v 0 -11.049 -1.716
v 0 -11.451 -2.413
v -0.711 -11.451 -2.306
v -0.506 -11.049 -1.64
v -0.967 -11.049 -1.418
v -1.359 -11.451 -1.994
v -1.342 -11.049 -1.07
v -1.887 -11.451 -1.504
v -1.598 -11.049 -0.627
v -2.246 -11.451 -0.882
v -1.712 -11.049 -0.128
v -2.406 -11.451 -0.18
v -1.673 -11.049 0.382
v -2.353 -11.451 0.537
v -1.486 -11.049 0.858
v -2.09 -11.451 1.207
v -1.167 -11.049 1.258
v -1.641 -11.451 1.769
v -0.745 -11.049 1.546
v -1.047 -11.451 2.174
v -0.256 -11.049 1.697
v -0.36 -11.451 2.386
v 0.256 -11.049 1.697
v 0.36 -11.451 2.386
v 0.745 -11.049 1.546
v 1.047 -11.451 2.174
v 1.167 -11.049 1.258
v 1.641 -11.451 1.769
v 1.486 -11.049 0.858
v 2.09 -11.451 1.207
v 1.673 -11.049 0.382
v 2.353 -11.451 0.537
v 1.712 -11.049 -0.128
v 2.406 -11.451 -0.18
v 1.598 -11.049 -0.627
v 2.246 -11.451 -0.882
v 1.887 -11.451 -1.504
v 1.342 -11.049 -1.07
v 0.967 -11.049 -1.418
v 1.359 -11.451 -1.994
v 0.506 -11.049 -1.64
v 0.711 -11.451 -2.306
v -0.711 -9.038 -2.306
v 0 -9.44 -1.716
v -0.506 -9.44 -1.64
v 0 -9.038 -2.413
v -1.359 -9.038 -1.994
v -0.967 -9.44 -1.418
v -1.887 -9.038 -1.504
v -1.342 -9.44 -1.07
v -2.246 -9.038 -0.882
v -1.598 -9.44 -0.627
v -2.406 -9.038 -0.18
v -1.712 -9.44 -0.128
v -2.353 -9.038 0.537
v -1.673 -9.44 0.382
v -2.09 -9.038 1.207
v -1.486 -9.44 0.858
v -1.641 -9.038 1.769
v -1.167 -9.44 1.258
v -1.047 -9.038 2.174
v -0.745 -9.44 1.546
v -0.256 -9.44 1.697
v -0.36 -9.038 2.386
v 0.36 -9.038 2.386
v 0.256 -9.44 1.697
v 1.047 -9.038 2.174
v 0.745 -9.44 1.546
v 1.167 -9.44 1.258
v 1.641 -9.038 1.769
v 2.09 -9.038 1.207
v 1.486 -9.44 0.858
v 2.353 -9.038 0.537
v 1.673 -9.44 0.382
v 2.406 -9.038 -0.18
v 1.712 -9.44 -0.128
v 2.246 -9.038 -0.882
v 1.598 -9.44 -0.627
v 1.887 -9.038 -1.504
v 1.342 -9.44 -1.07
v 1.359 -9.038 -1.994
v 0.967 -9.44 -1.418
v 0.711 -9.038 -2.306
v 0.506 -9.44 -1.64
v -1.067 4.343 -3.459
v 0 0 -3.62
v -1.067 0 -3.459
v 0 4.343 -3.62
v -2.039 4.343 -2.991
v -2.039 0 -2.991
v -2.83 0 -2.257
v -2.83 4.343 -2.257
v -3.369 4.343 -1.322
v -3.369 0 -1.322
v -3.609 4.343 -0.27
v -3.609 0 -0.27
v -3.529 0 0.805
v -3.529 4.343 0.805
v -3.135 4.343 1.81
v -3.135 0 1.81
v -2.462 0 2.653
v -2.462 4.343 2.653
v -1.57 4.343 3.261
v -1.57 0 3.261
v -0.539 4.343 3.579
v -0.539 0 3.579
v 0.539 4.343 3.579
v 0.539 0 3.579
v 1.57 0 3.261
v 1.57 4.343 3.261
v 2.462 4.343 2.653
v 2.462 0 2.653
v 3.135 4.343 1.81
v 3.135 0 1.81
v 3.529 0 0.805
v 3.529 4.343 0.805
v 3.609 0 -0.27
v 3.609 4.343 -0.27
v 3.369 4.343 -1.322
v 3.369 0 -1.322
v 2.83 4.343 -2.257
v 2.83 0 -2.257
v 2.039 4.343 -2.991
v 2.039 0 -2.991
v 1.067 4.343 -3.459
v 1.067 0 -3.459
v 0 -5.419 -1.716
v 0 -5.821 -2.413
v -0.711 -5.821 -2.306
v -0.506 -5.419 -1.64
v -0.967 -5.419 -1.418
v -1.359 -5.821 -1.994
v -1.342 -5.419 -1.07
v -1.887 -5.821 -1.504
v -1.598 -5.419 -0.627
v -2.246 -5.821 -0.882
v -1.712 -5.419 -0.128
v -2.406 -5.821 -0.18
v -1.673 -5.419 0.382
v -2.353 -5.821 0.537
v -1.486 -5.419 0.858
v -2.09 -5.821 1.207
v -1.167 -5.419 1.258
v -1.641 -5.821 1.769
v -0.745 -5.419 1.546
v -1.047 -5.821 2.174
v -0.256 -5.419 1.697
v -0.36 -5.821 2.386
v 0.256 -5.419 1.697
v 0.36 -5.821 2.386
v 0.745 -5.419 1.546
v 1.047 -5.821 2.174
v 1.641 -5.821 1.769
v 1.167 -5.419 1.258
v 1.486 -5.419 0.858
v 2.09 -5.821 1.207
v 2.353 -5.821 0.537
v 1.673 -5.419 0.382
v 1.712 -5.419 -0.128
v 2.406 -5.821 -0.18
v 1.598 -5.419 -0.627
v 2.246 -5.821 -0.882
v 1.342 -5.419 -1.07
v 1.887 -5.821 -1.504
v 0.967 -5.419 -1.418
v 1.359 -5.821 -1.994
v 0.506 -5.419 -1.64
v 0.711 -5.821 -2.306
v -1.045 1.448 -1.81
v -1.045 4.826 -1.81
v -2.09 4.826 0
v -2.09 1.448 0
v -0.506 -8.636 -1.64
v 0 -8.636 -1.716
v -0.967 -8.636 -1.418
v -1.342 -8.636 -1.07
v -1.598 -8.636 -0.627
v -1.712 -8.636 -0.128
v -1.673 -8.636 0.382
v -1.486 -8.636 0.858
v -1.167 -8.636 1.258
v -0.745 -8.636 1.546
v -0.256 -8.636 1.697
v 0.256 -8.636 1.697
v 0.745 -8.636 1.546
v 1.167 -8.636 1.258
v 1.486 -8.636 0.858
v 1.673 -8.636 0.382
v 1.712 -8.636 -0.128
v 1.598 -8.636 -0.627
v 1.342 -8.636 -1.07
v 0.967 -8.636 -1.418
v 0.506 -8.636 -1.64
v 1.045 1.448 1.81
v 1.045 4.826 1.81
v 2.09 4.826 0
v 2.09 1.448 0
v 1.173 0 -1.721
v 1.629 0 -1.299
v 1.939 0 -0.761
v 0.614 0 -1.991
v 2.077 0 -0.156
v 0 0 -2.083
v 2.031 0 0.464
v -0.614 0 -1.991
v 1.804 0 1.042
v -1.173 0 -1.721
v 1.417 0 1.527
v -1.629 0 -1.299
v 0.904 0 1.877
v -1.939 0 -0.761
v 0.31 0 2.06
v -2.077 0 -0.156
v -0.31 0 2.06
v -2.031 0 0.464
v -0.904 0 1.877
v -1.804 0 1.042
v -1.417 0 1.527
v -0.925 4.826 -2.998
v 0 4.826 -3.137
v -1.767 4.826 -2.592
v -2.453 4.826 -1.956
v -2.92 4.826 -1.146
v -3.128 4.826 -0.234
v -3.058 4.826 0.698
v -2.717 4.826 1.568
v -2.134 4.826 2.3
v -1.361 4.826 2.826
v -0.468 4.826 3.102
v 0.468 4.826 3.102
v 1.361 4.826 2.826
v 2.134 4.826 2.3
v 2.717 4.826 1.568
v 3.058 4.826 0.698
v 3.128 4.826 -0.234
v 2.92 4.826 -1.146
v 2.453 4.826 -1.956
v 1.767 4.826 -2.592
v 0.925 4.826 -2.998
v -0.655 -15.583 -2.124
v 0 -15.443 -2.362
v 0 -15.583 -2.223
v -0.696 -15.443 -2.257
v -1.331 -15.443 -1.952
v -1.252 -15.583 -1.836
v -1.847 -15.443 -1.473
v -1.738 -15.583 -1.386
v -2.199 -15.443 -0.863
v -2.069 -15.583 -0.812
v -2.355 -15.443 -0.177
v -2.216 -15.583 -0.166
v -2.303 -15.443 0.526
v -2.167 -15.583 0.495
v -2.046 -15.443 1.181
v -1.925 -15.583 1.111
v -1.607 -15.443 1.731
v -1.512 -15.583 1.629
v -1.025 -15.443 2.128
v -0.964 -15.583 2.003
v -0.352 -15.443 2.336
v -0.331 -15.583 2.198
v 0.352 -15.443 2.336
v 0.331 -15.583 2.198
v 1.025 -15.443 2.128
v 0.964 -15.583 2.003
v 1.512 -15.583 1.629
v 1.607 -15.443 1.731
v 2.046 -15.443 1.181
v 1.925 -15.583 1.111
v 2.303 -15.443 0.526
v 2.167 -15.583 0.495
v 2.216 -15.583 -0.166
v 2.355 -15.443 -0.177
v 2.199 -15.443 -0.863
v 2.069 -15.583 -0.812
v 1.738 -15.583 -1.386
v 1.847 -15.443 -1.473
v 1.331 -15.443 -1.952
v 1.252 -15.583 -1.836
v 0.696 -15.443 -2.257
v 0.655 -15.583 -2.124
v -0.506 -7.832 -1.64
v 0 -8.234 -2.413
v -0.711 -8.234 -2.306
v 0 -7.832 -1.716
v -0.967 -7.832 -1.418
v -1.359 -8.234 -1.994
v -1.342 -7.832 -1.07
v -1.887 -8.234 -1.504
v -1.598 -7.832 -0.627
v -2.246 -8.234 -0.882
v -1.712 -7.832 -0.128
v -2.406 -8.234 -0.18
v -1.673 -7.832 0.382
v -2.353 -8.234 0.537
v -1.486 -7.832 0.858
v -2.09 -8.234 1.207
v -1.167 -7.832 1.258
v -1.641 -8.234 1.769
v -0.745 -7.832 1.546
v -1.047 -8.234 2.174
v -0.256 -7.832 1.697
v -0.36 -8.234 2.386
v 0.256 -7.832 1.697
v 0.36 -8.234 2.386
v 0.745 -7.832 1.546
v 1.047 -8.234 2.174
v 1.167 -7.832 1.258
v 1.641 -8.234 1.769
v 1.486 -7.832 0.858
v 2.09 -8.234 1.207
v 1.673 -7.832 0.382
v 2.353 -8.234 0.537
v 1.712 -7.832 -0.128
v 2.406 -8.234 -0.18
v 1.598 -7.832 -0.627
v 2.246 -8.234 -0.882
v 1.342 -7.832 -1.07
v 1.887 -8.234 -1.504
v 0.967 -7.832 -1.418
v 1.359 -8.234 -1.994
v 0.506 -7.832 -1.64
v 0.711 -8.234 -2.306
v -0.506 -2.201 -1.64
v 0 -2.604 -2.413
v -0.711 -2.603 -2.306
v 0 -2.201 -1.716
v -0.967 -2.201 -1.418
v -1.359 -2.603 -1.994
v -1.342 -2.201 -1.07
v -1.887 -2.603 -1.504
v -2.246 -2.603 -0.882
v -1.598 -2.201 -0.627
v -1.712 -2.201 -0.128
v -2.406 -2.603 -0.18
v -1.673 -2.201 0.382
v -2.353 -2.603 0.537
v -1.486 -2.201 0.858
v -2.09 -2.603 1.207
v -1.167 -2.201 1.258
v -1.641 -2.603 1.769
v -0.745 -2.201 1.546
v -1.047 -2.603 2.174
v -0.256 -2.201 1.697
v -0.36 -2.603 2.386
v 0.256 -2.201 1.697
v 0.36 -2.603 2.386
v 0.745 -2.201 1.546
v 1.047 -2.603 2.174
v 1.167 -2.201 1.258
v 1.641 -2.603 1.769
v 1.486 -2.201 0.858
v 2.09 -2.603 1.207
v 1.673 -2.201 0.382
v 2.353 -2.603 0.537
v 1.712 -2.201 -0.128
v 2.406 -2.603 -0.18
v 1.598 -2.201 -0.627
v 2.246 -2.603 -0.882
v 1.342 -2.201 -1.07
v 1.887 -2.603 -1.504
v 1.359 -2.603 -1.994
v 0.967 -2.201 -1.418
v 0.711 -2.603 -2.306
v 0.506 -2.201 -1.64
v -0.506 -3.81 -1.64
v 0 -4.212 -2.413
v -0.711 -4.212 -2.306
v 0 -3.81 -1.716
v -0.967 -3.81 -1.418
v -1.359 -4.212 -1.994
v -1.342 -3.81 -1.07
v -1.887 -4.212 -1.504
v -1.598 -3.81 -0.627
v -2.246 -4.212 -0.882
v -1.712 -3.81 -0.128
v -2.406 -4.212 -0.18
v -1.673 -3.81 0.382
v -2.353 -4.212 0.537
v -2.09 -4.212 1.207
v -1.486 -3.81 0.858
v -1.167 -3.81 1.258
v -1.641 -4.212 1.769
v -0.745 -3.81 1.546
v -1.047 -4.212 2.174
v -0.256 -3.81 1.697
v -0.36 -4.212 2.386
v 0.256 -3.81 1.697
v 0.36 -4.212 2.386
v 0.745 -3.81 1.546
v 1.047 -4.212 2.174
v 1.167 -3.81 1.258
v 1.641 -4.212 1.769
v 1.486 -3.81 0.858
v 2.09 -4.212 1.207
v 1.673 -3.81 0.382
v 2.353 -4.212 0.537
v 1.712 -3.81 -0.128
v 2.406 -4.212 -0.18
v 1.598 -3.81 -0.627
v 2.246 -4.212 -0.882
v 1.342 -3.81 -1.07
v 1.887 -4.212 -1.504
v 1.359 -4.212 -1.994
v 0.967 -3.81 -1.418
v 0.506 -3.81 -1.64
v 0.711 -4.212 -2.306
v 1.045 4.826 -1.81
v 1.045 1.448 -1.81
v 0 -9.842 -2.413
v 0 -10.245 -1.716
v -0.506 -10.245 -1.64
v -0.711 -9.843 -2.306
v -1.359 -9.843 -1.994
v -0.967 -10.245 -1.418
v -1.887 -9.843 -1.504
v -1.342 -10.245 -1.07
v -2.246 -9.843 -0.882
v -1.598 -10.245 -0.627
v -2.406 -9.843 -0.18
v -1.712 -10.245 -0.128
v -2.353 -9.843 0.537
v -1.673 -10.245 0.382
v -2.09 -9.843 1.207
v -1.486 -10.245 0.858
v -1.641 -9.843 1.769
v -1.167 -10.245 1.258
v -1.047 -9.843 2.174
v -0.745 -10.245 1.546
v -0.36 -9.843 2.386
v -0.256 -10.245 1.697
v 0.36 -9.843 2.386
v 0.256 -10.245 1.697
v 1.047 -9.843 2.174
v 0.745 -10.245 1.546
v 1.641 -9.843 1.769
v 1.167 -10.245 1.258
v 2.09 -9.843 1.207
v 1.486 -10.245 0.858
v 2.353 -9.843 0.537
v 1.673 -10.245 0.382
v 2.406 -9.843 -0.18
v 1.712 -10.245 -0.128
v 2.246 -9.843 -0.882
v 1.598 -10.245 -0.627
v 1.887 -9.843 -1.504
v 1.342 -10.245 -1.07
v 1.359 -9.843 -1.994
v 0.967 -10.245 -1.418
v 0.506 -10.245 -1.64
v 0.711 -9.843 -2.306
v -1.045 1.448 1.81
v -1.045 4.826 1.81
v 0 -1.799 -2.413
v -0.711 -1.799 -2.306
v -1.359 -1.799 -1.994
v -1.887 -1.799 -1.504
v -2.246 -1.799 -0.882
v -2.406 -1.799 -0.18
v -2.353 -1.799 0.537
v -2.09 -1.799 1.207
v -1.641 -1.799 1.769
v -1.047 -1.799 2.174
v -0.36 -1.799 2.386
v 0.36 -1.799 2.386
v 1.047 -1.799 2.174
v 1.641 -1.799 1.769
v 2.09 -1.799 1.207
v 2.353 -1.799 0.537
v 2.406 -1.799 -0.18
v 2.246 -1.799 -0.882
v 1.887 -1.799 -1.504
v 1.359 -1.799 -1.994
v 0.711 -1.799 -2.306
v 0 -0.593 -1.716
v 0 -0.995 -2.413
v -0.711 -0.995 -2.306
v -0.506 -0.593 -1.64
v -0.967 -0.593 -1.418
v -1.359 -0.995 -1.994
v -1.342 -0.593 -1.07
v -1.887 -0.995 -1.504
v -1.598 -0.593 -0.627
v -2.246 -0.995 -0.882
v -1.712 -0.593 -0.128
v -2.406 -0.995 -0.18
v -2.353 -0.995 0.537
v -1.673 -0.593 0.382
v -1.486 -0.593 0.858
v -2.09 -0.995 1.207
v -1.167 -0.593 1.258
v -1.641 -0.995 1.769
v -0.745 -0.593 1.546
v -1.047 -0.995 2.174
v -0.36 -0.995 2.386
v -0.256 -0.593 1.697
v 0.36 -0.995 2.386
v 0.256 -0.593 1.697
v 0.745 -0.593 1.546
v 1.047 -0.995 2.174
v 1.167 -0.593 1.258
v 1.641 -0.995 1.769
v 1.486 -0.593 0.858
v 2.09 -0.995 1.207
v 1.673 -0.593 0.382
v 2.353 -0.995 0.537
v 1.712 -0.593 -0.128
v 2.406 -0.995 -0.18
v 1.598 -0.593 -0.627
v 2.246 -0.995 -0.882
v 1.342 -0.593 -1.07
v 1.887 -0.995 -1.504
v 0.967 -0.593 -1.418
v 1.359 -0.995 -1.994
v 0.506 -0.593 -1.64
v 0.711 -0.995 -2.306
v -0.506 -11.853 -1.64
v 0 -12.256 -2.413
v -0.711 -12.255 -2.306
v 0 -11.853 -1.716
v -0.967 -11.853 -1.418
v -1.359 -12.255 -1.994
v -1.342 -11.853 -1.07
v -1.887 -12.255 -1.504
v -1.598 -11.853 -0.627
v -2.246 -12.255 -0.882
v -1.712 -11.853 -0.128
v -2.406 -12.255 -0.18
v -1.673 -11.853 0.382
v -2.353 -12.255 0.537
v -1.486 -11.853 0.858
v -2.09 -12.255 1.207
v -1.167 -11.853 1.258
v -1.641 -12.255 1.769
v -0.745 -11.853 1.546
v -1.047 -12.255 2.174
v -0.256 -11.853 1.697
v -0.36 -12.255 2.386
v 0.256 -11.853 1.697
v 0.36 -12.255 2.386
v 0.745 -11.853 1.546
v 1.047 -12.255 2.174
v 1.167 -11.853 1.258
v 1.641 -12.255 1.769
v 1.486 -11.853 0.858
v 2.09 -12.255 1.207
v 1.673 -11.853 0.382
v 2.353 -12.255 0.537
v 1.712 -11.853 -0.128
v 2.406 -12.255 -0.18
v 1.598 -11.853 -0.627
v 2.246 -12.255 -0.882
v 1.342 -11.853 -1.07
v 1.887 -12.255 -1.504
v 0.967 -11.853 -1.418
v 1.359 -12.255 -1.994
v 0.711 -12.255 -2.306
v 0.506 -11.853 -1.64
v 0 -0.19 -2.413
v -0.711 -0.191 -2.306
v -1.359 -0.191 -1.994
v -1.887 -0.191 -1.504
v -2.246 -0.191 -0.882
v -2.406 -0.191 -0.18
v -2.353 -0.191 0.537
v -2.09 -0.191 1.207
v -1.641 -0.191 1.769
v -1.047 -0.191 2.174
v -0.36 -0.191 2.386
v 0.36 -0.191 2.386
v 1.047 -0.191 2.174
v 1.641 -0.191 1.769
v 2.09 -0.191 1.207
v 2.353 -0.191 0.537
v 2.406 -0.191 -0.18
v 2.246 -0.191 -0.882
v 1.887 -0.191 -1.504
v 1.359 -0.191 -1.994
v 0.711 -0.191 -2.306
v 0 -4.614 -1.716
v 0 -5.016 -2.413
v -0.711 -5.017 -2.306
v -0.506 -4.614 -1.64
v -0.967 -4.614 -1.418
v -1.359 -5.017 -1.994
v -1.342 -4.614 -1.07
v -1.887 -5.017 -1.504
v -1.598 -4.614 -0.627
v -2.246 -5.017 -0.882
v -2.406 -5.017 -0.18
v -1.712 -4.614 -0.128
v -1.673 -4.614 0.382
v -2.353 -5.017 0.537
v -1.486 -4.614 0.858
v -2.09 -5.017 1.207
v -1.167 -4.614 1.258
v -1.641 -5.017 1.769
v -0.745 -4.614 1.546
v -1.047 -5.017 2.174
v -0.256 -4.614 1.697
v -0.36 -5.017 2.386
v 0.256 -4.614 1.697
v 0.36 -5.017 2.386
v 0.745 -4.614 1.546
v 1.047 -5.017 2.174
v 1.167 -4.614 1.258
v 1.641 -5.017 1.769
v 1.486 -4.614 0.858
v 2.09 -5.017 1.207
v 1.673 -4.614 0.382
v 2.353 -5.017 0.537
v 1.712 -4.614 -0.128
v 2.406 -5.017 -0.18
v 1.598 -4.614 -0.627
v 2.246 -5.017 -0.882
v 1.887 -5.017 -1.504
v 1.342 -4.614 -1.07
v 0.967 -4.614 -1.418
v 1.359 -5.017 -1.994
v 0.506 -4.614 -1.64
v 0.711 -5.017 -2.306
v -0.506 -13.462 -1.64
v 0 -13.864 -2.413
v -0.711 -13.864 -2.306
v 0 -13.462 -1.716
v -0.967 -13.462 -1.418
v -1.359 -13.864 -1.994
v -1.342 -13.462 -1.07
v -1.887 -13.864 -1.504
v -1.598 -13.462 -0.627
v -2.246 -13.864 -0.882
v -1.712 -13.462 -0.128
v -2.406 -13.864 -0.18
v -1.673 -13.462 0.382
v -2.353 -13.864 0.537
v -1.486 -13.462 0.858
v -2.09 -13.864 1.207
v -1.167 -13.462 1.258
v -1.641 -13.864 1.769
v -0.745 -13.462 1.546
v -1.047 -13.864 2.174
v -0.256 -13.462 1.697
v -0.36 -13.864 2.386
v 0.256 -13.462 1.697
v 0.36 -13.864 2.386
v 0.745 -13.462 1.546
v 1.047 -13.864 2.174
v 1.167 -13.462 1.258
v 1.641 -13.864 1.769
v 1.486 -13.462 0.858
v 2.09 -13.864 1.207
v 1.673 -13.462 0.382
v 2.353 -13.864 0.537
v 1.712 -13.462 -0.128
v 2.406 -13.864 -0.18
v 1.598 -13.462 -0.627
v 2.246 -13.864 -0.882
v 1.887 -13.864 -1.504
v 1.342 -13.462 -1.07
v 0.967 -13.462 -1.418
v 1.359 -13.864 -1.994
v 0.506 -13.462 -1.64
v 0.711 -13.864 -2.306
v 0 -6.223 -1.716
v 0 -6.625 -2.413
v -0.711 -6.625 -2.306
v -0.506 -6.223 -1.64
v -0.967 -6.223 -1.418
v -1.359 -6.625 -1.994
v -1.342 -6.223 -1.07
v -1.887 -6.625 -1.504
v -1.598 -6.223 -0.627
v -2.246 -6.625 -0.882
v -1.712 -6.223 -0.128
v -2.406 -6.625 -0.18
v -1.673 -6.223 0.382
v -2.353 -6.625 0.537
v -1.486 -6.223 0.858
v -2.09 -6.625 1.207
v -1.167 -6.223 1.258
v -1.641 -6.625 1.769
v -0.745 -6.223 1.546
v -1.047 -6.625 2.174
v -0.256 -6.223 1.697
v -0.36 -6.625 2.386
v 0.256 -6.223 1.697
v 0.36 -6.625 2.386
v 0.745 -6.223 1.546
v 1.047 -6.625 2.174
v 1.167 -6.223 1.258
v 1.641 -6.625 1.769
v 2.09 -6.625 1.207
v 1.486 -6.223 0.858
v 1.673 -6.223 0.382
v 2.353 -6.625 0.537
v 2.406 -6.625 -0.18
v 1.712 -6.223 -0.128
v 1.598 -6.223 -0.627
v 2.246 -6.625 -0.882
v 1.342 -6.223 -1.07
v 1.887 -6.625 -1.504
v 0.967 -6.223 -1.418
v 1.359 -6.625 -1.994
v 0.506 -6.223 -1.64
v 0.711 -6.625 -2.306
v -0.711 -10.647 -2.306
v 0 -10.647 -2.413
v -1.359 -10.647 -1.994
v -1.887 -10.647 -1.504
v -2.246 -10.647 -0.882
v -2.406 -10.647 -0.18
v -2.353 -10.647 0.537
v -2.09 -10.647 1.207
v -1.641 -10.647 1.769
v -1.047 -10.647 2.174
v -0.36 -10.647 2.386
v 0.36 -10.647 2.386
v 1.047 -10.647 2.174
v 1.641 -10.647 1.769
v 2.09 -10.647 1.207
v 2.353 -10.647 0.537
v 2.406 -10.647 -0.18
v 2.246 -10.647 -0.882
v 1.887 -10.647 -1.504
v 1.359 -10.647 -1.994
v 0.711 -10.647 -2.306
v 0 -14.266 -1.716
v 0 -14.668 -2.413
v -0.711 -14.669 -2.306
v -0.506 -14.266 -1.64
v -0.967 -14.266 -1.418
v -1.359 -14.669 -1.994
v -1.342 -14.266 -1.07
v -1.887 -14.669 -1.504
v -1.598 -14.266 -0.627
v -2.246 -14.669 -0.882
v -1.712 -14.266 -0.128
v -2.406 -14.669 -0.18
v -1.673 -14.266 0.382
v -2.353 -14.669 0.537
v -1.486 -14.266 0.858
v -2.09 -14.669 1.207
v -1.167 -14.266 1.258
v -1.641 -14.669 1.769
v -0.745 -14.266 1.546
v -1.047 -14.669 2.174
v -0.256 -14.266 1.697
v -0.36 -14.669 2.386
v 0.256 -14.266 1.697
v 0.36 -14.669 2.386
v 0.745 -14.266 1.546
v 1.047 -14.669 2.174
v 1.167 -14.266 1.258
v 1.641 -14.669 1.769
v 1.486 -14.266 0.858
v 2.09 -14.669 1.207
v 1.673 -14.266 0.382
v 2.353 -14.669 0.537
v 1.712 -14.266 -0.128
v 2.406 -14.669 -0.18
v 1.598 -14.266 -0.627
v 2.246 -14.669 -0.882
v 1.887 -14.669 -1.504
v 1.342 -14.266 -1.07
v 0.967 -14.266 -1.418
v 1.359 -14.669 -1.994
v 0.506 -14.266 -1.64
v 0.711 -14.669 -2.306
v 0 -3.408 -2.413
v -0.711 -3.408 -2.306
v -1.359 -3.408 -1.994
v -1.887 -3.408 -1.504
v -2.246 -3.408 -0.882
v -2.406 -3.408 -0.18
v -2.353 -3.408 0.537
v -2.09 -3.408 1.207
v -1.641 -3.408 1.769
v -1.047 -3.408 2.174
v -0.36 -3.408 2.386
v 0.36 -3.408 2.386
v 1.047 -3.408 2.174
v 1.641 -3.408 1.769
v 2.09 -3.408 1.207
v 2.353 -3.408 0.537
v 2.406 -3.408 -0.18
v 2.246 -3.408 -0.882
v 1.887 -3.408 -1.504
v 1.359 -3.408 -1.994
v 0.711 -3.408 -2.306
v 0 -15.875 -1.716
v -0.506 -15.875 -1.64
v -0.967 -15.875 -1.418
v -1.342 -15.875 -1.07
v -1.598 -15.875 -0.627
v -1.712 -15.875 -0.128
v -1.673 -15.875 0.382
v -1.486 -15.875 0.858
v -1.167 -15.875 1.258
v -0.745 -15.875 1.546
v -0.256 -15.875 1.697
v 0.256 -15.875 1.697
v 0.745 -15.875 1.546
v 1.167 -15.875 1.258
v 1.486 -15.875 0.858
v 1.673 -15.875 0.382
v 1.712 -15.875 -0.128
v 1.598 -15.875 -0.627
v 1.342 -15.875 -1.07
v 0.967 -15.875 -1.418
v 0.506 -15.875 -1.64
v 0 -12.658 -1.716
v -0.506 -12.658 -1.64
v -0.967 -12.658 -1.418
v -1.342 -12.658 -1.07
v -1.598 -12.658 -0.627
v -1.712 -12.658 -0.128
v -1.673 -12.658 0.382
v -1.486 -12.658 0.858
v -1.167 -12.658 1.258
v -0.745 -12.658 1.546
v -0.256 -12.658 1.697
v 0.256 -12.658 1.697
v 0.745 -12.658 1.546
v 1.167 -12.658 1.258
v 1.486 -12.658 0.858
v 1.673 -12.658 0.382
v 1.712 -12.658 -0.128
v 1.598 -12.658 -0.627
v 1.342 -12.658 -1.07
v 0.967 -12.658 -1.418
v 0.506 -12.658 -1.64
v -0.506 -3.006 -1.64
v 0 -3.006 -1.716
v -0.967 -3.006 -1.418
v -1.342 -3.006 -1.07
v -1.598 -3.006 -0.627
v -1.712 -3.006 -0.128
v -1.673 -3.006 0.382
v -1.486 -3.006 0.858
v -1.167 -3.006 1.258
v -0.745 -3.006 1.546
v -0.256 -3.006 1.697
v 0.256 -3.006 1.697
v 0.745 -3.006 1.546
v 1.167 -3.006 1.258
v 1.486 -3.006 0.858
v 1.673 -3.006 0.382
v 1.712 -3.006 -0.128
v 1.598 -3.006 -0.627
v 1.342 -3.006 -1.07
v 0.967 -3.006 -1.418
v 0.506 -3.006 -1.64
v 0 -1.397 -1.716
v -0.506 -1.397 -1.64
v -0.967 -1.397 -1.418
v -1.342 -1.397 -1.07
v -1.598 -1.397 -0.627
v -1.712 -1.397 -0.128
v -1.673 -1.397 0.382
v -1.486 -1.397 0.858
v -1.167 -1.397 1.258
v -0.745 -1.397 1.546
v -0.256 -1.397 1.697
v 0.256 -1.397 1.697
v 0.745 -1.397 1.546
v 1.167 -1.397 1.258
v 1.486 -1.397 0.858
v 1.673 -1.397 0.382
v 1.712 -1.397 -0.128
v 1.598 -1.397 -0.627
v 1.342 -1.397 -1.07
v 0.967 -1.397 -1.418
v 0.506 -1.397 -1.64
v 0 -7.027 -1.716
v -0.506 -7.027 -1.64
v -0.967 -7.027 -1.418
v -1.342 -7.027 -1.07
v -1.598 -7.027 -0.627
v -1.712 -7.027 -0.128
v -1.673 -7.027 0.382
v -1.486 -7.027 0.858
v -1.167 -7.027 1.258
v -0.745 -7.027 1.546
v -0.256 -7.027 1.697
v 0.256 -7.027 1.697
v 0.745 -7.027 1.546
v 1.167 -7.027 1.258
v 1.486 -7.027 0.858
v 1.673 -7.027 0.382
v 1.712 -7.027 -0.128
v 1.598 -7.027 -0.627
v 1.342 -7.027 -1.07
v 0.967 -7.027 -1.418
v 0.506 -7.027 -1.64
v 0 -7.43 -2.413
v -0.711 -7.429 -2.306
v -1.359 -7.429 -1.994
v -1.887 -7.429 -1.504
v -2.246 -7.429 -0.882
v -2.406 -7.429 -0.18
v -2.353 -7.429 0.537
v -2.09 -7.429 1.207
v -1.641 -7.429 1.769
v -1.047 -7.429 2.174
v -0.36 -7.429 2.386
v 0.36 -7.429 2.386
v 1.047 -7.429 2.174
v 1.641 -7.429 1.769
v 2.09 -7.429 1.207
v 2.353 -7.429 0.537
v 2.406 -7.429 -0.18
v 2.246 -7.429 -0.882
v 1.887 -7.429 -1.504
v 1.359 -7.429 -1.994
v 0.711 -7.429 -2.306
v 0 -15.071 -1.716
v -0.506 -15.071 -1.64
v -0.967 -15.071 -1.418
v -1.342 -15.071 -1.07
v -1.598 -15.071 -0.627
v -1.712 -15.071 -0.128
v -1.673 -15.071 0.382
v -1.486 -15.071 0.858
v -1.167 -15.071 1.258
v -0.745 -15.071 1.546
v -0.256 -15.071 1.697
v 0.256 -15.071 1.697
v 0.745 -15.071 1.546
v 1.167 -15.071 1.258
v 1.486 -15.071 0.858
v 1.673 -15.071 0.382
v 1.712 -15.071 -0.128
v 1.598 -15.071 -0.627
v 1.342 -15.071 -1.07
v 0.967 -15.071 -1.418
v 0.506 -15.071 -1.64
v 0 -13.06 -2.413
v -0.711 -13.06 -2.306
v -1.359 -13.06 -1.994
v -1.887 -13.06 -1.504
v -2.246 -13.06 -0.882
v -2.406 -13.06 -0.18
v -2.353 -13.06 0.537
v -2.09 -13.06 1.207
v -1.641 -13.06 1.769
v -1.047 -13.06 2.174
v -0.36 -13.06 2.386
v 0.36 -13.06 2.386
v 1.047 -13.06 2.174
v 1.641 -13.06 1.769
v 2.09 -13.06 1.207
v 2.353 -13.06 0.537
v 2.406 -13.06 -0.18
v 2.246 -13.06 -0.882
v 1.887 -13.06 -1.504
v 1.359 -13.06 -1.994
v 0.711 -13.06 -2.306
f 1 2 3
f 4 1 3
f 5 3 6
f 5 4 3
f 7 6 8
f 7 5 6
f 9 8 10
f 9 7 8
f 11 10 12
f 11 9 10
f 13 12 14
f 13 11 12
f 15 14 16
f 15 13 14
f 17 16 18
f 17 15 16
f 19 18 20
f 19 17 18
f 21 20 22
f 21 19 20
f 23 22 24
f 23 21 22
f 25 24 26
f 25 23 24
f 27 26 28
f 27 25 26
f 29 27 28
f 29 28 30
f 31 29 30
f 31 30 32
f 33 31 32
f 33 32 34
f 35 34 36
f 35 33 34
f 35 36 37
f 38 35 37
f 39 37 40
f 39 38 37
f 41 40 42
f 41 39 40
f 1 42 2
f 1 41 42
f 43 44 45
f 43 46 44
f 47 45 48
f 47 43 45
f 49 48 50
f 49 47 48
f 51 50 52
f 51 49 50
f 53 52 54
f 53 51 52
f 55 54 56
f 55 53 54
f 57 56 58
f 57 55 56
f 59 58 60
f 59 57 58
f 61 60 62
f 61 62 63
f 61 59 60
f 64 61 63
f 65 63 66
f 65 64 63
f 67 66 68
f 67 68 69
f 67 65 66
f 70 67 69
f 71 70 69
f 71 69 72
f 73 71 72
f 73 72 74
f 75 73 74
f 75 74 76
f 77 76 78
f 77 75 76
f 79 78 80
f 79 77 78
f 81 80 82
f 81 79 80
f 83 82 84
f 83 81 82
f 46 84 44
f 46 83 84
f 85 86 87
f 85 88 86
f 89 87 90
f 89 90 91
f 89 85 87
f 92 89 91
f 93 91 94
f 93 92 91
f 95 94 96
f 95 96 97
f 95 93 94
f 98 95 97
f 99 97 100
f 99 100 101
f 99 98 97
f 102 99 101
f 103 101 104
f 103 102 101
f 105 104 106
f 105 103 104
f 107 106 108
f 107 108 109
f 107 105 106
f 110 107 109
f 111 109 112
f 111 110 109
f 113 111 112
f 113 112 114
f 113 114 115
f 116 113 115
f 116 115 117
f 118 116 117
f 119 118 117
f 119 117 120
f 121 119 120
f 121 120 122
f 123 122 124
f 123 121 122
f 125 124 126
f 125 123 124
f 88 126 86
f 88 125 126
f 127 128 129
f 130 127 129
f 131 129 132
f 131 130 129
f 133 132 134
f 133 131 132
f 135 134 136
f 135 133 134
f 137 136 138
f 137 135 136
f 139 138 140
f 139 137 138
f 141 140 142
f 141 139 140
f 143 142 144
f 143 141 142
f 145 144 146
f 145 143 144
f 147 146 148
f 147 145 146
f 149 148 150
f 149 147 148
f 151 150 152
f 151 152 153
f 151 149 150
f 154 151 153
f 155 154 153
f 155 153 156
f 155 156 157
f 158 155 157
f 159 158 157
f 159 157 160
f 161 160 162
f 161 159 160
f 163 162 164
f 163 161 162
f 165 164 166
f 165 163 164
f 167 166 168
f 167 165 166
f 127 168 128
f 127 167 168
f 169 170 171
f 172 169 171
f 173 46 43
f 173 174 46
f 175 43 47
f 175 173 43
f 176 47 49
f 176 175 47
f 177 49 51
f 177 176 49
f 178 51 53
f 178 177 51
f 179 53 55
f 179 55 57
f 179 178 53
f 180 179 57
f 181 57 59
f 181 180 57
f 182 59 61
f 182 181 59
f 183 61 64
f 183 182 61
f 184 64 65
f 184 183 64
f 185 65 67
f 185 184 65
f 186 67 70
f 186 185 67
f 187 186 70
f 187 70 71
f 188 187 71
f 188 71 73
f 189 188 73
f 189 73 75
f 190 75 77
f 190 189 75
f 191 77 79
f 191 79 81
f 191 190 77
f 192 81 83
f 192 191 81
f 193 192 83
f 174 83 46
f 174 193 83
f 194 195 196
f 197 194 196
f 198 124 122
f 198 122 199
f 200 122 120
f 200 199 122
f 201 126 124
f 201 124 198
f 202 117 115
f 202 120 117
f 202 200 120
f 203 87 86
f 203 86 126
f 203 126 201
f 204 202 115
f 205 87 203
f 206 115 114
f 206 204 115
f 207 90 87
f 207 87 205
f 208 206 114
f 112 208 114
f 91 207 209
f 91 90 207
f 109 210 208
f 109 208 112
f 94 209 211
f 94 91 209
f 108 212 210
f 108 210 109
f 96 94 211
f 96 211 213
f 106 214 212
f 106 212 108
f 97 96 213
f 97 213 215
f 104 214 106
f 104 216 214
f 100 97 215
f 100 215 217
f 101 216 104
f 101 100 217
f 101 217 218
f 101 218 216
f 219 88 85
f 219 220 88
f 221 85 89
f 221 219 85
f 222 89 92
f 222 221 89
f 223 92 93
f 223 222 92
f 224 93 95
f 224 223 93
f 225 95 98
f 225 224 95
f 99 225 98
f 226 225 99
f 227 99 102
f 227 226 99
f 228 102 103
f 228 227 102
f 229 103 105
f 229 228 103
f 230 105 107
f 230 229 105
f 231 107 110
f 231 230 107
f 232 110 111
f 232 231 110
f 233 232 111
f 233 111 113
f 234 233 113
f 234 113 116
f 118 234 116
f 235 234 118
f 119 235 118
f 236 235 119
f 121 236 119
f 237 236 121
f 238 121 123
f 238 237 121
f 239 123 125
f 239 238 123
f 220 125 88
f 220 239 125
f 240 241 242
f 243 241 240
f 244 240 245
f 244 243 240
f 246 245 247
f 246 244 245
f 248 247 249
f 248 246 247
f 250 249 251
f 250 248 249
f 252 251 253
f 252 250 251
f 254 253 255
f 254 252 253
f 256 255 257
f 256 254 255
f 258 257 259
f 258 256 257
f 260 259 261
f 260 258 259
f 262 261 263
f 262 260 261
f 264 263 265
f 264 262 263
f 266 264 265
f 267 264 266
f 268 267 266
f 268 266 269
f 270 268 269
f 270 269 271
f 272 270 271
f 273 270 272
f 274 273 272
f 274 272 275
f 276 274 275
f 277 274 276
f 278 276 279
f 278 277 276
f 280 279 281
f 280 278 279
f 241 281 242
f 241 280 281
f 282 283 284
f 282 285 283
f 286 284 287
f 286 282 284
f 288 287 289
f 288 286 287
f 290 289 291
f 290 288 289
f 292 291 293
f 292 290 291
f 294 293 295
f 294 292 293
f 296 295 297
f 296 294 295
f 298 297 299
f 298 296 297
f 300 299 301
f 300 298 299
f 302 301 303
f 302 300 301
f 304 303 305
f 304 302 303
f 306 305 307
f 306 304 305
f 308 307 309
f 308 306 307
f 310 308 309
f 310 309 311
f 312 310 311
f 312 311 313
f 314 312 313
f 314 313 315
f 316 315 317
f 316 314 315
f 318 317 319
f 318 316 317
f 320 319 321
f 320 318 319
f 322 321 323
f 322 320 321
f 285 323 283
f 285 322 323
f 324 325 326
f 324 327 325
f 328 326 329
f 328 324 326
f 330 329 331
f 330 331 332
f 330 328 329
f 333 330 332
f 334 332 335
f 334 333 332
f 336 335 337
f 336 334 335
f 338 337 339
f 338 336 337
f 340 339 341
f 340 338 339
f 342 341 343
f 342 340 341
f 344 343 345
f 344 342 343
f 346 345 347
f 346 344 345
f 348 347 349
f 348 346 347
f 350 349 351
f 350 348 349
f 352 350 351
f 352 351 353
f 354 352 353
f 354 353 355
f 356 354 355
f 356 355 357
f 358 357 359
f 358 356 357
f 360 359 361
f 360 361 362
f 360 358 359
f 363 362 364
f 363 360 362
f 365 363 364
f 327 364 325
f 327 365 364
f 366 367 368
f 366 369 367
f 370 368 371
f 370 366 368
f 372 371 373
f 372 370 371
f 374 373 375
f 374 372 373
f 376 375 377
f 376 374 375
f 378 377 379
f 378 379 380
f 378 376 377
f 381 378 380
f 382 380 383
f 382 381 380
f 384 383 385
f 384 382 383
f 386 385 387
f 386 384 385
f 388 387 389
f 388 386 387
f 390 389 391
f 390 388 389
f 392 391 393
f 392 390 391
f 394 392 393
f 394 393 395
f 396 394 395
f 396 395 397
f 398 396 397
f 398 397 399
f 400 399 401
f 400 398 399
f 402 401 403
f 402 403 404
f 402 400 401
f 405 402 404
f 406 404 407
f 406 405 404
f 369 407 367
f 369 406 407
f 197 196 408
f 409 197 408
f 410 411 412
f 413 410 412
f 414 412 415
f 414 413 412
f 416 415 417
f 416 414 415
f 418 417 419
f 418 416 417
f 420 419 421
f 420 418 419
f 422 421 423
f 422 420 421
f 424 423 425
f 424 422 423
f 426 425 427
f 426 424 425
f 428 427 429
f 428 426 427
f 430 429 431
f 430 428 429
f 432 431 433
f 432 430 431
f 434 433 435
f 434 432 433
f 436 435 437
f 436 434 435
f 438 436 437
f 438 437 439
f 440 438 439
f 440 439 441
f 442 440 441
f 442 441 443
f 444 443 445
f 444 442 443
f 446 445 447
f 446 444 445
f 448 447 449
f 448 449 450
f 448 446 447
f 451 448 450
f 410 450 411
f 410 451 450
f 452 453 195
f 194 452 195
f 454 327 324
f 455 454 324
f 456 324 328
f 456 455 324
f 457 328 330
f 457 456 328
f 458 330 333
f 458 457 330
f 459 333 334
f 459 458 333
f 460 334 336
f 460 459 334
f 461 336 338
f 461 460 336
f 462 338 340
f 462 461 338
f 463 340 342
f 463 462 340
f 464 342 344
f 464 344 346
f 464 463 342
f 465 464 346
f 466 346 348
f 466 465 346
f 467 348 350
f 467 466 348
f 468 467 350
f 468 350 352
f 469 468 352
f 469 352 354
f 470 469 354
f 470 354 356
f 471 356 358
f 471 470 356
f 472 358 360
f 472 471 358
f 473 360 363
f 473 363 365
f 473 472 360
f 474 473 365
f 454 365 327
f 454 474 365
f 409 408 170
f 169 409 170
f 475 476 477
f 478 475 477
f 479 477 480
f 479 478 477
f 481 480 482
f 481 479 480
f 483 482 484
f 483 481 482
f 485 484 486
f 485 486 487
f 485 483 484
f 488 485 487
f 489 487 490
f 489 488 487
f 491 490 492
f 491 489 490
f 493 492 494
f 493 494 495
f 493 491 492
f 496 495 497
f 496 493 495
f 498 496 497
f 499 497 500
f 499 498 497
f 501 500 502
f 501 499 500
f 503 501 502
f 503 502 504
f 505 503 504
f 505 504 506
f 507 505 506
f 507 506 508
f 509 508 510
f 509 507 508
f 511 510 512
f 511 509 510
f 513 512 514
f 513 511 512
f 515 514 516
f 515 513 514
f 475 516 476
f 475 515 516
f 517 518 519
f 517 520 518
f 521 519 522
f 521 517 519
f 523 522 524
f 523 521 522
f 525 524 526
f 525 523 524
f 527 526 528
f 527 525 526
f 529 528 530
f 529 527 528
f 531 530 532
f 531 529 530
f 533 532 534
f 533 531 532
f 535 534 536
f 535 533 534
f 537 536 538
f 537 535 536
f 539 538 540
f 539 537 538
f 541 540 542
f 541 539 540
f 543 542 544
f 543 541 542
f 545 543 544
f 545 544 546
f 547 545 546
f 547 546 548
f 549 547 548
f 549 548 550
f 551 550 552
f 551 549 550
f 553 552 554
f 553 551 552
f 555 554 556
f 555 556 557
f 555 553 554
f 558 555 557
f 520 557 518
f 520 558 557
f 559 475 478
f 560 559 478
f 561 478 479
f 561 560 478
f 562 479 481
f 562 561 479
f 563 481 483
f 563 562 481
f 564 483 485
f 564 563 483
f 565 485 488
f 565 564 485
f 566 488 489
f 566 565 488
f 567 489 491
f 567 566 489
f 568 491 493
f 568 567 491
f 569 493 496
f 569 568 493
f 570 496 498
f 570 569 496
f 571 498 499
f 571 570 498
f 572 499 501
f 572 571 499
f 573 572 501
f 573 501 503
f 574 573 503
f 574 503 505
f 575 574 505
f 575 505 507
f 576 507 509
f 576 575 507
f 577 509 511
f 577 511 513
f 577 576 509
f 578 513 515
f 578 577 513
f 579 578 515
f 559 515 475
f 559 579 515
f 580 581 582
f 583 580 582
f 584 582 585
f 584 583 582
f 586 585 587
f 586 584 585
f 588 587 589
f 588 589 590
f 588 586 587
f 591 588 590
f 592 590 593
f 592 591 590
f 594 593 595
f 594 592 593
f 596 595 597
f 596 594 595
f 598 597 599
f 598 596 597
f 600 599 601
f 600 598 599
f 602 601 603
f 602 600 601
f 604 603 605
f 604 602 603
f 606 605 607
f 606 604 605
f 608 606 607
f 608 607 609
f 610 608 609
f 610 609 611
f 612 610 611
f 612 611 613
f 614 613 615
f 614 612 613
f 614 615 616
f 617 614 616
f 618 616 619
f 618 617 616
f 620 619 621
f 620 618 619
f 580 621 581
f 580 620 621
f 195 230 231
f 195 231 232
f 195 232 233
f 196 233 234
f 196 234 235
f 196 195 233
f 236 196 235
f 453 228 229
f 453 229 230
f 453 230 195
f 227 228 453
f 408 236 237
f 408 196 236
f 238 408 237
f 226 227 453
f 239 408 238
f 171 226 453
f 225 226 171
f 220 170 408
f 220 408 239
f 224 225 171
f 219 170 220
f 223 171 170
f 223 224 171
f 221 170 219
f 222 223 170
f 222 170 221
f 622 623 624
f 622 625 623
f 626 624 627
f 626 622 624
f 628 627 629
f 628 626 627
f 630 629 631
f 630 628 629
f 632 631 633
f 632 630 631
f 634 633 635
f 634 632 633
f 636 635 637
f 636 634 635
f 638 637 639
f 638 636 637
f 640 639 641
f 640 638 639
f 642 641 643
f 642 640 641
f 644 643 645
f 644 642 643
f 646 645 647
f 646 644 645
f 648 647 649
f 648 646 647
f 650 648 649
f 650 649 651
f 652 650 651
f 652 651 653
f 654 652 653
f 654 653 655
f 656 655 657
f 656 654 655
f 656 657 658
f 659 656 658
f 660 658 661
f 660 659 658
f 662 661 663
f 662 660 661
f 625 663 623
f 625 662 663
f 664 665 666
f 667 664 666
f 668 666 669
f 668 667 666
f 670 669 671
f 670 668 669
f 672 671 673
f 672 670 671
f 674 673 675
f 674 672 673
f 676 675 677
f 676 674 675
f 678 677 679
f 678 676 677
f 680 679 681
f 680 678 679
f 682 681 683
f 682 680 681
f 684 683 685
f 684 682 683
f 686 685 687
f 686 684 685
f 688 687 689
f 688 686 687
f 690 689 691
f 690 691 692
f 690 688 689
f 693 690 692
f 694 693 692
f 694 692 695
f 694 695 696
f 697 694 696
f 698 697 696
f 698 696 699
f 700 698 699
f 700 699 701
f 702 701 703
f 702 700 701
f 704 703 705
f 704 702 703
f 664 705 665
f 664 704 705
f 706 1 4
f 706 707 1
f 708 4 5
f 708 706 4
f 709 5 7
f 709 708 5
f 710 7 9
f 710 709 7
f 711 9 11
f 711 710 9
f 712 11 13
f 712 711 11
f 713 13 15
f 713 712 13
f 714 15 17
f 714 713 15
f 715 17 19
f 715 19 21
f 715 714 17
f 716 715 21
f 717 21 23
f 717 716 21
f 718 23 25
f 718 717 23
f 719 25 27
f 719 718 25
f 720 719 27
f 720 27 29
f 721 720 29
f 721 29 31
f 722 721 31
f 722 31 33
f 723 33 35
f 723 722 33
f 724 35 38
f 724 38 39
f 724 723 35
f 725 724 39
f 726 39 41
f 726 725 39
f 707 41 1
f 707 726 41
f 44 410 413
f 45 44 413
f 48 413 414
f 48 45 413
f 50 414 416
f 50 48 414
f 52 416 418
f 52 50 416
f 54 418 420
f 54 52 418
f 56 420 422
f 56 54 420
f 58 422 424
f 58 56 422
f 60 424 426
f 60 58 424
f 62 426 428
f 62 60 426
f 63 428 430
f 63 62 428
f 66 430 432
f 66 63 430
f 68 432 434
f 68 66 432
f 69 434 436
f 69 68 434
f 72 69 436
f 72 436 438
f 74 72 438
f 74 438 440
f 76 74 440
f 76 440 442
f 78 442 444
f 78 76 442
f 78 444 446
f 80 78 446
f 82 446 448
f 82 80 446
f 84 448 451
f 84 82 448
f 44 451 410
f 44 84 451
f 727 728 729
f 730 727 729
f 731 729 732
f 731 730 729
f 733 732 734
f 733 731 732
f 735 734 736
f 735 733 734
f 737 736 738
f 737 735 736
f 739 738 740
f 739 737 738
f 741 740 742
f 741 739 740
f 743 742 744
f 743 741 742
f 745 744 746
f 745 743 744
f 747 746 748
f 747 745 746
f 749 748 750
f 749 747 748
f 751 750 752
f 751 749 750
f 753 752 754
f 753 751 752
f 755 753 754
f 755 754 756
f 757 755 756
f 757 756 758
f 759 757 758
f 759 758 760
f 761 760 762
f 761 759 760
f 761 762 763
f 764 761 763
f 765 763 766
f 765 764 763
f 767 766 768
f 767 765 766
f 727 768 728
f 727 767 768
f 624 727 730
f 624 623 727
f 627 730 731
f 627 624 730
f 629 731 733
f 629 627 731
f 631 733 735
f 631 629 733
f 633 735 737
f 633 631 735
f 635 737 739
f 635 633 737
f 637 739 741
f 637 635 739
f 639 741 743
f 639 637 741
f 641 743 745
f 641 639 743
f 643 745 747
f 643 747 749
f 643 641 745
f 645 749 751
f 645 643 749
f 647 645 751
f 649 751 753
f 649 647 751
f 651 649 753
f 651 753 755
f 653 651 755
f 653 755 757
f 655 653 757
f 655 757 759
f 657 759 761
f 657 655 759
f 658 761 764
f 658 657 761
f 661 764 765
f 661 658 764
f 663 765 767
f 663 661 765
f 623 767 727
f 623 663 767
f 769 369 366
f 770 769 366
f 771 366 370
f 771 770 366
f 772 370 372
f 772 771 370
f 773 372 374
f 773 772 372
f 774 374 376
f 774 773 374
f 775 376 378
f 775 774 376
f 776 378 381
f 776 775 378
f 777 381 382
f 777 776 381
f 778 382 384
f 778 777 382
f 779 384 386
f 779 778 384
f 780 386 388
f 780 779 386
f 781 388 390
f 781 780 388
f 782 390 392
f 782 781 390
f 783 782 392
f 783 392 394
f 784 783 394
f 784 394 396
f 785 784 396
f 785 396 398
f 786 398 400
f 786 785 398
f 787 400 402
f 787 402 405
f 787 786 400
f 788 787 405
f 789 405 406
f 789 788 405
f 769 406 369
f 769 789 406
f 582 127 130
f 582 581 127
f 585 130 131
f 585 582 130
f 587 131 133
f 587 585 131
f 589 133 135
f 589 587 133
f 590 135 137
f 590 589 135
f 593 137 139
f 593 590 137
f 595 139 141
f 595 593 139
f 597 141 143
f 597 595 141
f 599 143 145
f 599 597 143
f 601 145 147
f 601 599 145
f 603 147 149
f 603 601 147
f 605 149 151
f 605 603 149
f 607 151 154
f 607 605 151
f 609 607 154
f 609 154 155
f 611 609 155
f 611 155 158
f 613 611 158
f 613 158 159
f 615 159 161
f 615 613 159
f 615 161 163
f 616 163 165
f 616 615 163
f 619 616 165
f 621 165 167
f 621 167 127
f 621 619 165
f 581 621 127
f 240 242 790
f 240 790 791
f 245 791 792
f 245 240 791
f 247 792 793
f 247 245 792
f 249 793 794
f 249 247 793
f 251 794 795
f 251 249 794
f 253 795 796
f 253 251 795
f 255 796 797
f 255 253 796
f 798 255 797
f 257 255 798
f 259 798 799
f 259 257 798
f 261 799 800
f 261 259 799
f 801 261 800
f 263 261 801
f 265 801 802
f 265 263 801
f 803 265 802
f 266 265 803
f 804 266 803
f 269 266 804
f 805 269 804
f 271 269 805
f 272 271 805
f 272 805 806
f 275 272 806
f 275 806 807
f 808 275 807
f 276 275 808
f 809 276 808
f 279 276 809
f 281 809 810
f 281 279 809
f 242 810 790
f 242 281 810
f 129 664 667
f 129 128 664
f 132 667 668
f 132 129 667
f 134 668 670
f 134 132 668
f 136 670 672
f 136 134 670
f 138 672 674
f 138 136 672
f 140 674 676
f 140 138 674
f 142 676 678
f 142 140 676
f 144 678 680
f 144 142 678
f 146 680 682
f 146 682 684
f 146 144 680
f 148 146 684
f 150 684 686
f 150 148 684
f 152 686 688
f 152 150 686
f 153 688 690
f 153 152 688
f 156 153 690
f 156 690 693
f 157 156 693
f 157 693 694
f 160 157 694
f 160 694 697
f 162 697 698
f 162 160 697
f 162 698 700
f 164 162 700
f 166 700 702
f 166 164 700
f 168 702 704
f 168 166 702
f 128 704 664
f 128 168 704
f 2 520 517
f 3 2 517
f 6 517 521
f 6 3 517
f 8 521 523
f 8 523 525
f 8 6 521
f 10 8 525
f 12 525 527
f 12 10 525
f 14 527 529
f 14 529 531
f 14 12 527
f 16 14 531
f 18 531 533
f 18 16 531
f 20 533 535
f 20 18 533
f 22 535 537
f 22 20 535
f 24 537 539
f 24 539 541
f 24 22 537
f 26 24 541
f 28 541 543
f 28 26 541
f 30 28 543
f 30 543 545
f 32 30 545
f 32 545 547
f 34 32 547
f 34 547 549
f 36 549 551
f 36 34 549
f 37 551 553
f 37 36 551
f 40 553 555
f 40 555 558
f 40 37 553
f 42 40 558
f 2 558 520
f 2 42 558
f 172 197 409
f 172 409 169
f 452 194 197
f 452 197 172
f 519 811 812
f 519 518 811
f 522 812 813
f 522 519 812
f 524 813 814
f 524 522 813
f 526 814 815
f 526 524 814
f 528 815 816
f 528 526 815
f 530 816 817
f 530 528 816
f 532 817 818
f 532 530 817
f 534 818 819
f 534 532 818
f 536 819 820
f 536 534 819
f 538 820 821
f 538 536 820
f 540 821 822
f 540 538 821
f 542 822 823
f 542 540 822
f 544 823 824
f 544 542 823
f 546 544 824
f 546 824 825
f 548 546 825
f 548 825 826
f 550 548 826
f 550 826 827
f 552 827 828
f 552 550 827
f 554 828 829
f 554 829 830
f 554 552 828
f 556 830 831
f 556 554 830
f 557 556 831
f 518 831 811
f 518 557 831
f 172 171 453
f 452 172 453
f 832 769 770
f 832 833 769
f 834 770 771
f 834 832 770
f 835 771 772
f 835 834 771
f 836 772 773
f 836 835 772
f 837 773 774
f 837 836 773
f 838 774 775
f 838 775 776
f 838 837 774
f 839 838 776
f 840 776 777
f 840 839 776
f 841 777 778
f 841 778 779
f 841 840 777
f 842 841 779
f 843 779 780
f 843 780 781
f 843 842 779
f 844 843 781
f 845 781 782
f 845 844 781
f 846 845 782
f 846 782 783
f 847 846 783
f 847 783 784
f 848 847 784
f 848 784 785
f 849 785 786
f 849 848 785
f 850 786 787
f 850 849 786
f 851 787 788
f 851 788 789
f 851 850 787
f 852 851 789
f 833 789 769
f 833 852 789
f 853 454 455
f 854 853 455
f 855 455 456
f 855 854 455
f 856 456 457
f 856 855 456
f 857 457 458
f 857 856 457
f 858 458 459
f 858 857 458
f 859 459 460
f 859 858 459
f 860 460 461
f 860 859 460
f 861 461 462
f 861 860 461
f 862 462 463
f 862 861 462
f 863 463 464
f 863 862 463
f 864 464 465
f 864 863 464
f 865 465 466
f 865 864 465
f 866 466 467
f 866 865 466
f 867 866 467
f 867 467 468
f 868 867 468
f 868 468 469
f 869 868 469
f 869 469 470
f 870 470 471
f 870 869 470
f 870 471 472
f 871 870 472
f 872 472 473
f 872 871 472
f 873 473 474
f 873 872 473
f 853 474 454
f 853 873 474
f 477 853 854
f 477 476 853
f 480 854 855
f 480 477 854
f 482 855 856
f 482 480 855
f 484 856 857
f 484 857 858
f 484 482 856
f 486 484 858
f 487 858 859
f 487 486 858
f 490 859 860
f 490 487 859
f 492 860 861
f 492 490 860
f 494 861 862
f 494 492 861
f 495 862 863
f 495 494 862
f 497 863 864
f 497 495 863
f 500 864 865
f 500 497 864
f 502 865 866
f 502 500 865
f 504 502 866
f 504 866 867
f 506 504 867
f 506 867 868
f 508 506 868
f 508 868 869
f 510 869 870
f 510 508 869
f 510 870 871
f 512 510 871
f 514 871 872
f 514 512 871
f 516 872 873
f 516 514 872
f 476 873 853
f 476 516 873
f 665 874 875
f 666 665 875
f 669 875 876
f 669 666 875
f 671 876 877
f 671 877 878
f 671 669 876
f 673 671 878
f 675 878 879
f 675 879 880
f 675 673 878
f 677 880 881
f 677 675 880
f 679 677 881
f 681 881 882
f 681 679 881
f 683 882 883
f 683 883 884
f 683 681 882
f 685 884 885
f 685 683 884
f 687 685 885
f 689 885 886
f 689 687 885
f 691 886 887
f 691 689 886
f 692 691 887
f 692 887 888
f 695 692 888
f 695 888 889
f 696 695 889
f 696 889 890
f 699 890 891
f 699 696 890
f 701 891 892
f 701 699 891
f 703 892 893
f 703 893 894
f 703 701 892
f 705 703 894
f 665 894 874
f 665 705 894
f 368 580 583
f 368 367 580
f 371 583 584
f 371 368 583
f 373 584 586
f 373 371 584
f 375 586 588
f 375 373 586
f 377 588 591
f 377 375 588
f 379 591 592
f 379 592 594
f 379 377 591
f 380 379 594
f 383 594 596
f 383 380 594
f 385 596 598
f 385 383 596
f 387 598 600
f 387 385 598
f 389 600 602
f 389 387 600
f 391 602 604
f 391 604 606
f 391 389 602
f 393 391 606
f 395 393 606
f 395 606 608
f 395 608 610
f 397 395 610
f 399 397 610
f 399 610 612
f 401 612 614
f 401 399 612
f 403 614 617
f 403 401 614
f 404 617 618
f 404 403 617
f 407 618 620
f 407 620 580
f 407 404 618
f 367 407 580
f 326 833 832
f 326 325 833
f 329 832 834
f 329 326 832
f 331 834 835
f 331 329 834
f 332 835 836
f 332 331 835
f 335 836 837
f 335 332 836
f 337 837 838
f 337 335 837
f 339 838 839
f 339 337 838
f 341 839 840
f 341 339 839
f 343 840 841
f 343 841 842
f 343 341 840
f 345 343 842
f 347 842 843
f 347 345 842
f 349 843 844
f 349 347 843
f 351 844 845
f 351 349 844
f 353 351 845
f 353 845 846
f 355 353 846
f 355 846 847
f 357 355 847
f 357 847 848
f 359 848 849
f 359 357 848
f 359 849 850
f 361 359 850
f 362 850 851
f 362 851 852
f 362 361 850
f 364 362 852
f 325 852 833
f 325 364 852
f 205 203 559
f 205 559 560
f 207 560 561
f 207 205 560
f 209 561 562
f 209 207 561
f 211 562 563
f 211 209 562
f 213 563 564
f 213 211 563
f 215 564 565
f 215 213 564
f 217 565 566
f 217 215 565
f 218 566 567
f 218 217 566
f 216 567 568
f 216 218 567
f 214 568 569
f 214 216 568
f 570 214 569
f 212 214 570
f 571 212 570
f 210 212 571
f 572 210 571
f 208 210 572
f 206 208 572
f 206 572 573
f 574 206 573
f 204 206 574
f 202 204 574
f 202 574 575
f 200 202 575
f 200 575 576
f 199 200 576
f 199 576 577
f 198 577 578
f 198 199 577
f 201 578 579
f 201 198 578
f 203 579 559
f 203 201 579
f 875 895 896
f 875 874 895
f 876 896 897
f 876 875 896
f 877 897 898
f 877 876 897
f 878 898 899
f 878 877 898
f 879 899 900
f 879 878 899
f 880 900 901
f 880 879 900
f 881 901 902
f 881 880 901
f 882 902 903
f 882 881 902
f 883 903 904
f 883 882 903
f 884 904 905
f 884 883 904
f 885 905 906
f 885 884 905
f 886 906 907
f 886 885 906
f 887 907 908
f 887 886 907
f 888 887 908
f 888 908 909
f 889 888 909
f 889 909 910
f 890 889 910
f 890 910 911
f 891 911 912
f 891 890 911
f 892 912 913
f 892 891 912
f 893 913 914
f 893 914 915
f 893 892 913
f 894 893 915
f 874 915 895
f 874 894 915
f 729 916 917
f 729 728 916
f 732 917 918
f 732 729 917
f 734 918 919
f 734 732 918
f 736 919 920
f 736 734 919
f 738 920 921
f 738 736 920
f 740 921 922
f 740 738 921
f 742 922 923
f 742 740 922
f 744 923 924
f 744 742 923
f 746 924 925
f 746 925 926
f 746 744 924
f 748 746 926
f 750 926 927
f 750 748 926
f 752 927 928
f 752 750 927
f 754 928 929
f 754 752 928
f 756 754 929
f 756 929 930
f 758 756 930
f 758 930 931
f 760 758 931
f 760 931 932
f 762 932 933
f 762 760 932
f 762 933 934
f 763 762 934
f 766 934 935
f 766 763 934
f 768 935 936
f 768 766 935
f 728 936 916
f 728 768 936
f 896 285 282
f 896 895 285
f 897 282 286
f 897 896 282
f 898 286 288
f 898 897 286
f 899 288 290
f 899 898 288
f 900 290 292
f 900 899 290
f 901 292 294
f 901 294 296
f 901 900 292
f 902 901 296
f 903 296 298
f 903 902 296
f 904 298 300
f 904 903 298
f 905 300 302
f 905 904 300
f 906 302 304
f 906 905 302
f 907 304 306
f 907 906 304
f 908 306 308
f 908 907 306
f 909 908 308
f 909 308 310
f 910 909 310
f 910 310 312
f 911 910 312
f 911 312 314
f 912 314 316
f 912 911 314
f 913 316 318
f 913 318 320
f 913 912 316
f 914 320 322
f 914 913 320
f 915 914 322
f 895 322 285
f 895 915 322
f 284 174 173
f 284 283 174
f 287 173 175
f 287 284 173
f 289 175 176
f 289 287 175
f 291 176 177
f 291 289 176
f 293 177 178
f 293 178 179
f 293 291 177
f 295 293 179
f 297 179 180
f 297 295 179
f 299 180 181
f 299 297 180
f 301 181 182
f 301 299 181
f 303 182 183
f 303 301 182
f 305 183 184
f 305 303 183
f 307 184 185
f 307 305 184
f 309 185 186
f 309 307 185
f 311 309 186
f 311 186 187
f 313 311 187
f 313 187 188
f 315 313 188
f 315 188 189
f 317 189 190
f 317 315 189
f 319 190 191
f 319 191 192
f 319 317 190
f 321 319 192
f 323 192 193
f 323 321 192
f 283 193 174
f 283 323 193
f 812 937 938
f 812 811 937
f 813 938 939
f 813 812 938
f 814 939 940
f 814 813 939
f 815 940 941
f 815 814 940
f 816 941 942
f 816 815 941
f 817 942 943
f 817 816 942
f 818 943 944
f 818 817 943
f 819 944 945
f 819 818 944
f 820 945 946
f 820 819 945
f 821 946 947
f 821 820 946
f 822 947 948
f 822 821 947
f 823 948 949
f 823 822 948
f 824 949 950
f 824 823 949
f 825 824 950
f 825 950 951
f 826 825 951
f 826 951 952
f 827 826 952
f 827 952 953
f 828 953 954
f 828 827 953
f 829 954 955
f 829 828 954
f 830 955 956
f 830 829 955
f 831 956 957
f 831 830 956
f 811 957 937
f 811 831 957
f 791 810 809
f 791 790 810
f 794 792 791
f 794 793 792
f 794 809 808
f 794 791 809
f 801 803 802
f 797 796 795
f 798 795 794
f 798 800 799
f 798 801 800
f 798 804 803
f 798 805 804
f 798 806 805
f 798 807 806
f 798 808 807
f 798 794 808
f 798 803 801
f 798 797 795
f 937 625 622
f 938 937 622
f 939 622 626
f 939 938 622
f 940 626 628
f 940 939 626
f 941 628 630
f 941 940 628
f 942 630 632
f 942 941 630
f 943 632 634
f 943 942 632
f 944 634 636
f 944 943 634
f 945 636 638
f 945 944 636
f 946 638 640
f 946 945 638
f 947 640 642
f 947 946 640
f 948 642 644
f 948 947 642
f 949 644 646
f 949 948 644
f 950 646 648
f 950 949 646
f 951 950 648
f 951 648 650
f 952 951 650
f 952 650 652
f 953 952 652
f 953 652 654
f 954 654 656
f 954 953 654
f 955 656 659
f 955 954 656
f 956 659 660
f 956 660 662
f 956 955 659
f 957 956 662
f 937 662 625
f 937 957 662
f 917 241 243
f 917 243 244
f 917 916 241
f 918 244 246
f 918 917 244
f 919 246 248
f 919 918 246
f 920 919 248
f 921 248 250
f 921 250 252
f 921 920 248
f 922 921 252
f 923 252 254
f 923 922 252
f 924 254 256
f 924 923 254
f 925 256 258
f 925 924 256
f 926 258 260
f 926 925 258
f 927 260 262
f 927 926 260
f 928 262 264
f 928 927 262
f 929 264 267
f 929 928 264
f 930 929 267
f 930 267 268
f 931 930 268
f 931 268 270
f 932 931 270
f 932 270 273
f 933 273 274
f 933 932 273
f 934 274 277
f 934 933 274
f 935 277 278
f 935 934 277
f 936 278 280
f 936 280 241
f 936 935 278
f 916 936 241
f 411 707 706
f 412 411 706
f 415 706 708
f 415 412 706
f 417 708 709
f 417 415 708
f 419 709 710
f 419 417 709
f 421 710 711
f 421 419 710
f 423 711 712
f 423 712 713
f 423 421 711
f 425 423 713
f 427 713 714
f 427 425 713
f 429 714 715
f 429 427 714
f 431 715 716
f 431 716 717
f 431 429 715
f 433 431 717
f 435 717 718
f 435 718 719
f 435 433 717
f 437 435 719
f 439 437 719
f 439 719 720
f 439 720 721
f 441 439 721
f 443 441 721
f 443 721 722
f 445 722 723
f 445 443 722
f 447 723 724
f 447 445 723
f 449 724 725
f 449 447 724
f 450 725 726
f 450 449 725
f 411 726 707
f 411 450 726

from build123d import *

# Parameters (mm, degrees)
HEX_CUT_DRIVEN_DEPTH = 3.3782


with BuildPart() as part:
    # Sketch3 → Shank Revolve ( driven ) (revolve)
    with BuildSketch(Plane.XY, mode=Mode.PRIVATE) as shank_revolve_driven_sk:
        Polygon((0, 1.4478), (0, -15.875), (1.9304, -15.875), (2.413, -15.3924), (2.413, 1.4478), align=None)
    revolve(shank_revolve_driven_sk.sketch.rotate(Axis((0, -50, 0), (0, 1, 0)), 90), axis=Axis((0, -50, 0), (0, 1, 0)))

    # Sketch4 → Thread Revolve Cut ( driven ) (revolve, cut)
    with BuildSketch(Plane.XY, mode=Mode.PRIVATE) as thread_revolve_cut_driven_sk:
        Polygon((1.7164269, 3.429), (2.413, 3.831166667), (3.217333333, 3.831166667), (3.217333333, -17.885833333), (2.413, -17.885833333), (1.7164269, -17.483666667), (2.413, -17.0815), (1.7164269, -16.679333333), (2.413, -16.277166667), (1.7164269, -15.875), (2.413, -15.472833333), (1.7164269, -15.070666667), (2.413, -14.6685), (1.7164269, -14.266333333), (2.413, -13.864166667), (1.7164269, -13.462), (2.413, -13.059833333), (1.7164269, -12.657666667), (2.413, -12.2555), (1.7164269, -11.853333333), (2.413, -11.451166667), (1.7164269, -11.049), (2.413, -10.646833333), (1.7164269, -10.244666667), (2.413, -9.8425), (1.7164269, -9.440333333), (2.413, -9.038166667), (1.7164269, -8.636), (2.413, -8.233833333), (1.7164269, -7.831666667), (2.413, -7.4295), (1.7164269, -7.027333333), (2.413, -6.625166667), (1.7164269, -6.223), (2.413, -5.820833333), (1.7164269, -5.418666667), (2.413, -5.0165), (1.7164269, -4.614333333), (2.413, -4.212166667), (1.7164269, -3.81), (2.413, -3.407833333), (1.7164269, -3.005666667), (2.413, -2.6035), (1.7164269, -2.201333333), (2.413, -1.799166667), (1.7164269, -1.397), (2.413, -0.994833333), (1.7164269, -0.592666667), (2.413, -0.1905), (1.7164269, 0.211666667), (2.413, 0.613833333), (1.7164269, 1.016), (2.413, 1.418166667), (1.7164269, 1.820333333), (2.413, 2.2225), (1.7164269, 2.624666667), (2.413, 3.026833333), align=None)
    revolve(thread_revolve_cut_driven_sk.sketch.rotate(Axis((0, -50, 0), (0, 1, 0)), 90), axis=Axis((0, -50, 0), (0, 1, 0)), mode=Mode.SUBTRACT)

    # Sketch5 → Head Revolve ( driven ) (revolve)
    with BuildSketch(Plane.XY, mode=Mode.PRIVATE) as head_revolve_driven_sk:
        Polygon((0, 4.826), (0, 0), (3.6195, 0), (3.6195, 4.3434), (3.1369, 4.826), align=None)
    revolve(head_revolve_driven_sk.sketch.rotate(Axis((0, -50, 0), (0, 1, 0)), 90), axis=Axis((0, -50, 0), (0, 1, 0)))

    # Sketch2 → Hex Cut ( driven ) (cut)
    with BuildSketch(Plane(origin=(0, 4.826, 0), x_dir=(-1, 0, 0), z_dir=(0, 1, 0))):
        Polygon((-2.089719299, 0), (-1.04485965, -1.80975), (1.04485965, -1.80975), (2.089719299, 0), (1.04485965, 1.80975), (-1.04485965, 1.80975), align=None)
    extrude(amount=-HEX_CUT_DRIVEN_DEPTH, mode=Mode.SUBTRACT)


solid = part.part
